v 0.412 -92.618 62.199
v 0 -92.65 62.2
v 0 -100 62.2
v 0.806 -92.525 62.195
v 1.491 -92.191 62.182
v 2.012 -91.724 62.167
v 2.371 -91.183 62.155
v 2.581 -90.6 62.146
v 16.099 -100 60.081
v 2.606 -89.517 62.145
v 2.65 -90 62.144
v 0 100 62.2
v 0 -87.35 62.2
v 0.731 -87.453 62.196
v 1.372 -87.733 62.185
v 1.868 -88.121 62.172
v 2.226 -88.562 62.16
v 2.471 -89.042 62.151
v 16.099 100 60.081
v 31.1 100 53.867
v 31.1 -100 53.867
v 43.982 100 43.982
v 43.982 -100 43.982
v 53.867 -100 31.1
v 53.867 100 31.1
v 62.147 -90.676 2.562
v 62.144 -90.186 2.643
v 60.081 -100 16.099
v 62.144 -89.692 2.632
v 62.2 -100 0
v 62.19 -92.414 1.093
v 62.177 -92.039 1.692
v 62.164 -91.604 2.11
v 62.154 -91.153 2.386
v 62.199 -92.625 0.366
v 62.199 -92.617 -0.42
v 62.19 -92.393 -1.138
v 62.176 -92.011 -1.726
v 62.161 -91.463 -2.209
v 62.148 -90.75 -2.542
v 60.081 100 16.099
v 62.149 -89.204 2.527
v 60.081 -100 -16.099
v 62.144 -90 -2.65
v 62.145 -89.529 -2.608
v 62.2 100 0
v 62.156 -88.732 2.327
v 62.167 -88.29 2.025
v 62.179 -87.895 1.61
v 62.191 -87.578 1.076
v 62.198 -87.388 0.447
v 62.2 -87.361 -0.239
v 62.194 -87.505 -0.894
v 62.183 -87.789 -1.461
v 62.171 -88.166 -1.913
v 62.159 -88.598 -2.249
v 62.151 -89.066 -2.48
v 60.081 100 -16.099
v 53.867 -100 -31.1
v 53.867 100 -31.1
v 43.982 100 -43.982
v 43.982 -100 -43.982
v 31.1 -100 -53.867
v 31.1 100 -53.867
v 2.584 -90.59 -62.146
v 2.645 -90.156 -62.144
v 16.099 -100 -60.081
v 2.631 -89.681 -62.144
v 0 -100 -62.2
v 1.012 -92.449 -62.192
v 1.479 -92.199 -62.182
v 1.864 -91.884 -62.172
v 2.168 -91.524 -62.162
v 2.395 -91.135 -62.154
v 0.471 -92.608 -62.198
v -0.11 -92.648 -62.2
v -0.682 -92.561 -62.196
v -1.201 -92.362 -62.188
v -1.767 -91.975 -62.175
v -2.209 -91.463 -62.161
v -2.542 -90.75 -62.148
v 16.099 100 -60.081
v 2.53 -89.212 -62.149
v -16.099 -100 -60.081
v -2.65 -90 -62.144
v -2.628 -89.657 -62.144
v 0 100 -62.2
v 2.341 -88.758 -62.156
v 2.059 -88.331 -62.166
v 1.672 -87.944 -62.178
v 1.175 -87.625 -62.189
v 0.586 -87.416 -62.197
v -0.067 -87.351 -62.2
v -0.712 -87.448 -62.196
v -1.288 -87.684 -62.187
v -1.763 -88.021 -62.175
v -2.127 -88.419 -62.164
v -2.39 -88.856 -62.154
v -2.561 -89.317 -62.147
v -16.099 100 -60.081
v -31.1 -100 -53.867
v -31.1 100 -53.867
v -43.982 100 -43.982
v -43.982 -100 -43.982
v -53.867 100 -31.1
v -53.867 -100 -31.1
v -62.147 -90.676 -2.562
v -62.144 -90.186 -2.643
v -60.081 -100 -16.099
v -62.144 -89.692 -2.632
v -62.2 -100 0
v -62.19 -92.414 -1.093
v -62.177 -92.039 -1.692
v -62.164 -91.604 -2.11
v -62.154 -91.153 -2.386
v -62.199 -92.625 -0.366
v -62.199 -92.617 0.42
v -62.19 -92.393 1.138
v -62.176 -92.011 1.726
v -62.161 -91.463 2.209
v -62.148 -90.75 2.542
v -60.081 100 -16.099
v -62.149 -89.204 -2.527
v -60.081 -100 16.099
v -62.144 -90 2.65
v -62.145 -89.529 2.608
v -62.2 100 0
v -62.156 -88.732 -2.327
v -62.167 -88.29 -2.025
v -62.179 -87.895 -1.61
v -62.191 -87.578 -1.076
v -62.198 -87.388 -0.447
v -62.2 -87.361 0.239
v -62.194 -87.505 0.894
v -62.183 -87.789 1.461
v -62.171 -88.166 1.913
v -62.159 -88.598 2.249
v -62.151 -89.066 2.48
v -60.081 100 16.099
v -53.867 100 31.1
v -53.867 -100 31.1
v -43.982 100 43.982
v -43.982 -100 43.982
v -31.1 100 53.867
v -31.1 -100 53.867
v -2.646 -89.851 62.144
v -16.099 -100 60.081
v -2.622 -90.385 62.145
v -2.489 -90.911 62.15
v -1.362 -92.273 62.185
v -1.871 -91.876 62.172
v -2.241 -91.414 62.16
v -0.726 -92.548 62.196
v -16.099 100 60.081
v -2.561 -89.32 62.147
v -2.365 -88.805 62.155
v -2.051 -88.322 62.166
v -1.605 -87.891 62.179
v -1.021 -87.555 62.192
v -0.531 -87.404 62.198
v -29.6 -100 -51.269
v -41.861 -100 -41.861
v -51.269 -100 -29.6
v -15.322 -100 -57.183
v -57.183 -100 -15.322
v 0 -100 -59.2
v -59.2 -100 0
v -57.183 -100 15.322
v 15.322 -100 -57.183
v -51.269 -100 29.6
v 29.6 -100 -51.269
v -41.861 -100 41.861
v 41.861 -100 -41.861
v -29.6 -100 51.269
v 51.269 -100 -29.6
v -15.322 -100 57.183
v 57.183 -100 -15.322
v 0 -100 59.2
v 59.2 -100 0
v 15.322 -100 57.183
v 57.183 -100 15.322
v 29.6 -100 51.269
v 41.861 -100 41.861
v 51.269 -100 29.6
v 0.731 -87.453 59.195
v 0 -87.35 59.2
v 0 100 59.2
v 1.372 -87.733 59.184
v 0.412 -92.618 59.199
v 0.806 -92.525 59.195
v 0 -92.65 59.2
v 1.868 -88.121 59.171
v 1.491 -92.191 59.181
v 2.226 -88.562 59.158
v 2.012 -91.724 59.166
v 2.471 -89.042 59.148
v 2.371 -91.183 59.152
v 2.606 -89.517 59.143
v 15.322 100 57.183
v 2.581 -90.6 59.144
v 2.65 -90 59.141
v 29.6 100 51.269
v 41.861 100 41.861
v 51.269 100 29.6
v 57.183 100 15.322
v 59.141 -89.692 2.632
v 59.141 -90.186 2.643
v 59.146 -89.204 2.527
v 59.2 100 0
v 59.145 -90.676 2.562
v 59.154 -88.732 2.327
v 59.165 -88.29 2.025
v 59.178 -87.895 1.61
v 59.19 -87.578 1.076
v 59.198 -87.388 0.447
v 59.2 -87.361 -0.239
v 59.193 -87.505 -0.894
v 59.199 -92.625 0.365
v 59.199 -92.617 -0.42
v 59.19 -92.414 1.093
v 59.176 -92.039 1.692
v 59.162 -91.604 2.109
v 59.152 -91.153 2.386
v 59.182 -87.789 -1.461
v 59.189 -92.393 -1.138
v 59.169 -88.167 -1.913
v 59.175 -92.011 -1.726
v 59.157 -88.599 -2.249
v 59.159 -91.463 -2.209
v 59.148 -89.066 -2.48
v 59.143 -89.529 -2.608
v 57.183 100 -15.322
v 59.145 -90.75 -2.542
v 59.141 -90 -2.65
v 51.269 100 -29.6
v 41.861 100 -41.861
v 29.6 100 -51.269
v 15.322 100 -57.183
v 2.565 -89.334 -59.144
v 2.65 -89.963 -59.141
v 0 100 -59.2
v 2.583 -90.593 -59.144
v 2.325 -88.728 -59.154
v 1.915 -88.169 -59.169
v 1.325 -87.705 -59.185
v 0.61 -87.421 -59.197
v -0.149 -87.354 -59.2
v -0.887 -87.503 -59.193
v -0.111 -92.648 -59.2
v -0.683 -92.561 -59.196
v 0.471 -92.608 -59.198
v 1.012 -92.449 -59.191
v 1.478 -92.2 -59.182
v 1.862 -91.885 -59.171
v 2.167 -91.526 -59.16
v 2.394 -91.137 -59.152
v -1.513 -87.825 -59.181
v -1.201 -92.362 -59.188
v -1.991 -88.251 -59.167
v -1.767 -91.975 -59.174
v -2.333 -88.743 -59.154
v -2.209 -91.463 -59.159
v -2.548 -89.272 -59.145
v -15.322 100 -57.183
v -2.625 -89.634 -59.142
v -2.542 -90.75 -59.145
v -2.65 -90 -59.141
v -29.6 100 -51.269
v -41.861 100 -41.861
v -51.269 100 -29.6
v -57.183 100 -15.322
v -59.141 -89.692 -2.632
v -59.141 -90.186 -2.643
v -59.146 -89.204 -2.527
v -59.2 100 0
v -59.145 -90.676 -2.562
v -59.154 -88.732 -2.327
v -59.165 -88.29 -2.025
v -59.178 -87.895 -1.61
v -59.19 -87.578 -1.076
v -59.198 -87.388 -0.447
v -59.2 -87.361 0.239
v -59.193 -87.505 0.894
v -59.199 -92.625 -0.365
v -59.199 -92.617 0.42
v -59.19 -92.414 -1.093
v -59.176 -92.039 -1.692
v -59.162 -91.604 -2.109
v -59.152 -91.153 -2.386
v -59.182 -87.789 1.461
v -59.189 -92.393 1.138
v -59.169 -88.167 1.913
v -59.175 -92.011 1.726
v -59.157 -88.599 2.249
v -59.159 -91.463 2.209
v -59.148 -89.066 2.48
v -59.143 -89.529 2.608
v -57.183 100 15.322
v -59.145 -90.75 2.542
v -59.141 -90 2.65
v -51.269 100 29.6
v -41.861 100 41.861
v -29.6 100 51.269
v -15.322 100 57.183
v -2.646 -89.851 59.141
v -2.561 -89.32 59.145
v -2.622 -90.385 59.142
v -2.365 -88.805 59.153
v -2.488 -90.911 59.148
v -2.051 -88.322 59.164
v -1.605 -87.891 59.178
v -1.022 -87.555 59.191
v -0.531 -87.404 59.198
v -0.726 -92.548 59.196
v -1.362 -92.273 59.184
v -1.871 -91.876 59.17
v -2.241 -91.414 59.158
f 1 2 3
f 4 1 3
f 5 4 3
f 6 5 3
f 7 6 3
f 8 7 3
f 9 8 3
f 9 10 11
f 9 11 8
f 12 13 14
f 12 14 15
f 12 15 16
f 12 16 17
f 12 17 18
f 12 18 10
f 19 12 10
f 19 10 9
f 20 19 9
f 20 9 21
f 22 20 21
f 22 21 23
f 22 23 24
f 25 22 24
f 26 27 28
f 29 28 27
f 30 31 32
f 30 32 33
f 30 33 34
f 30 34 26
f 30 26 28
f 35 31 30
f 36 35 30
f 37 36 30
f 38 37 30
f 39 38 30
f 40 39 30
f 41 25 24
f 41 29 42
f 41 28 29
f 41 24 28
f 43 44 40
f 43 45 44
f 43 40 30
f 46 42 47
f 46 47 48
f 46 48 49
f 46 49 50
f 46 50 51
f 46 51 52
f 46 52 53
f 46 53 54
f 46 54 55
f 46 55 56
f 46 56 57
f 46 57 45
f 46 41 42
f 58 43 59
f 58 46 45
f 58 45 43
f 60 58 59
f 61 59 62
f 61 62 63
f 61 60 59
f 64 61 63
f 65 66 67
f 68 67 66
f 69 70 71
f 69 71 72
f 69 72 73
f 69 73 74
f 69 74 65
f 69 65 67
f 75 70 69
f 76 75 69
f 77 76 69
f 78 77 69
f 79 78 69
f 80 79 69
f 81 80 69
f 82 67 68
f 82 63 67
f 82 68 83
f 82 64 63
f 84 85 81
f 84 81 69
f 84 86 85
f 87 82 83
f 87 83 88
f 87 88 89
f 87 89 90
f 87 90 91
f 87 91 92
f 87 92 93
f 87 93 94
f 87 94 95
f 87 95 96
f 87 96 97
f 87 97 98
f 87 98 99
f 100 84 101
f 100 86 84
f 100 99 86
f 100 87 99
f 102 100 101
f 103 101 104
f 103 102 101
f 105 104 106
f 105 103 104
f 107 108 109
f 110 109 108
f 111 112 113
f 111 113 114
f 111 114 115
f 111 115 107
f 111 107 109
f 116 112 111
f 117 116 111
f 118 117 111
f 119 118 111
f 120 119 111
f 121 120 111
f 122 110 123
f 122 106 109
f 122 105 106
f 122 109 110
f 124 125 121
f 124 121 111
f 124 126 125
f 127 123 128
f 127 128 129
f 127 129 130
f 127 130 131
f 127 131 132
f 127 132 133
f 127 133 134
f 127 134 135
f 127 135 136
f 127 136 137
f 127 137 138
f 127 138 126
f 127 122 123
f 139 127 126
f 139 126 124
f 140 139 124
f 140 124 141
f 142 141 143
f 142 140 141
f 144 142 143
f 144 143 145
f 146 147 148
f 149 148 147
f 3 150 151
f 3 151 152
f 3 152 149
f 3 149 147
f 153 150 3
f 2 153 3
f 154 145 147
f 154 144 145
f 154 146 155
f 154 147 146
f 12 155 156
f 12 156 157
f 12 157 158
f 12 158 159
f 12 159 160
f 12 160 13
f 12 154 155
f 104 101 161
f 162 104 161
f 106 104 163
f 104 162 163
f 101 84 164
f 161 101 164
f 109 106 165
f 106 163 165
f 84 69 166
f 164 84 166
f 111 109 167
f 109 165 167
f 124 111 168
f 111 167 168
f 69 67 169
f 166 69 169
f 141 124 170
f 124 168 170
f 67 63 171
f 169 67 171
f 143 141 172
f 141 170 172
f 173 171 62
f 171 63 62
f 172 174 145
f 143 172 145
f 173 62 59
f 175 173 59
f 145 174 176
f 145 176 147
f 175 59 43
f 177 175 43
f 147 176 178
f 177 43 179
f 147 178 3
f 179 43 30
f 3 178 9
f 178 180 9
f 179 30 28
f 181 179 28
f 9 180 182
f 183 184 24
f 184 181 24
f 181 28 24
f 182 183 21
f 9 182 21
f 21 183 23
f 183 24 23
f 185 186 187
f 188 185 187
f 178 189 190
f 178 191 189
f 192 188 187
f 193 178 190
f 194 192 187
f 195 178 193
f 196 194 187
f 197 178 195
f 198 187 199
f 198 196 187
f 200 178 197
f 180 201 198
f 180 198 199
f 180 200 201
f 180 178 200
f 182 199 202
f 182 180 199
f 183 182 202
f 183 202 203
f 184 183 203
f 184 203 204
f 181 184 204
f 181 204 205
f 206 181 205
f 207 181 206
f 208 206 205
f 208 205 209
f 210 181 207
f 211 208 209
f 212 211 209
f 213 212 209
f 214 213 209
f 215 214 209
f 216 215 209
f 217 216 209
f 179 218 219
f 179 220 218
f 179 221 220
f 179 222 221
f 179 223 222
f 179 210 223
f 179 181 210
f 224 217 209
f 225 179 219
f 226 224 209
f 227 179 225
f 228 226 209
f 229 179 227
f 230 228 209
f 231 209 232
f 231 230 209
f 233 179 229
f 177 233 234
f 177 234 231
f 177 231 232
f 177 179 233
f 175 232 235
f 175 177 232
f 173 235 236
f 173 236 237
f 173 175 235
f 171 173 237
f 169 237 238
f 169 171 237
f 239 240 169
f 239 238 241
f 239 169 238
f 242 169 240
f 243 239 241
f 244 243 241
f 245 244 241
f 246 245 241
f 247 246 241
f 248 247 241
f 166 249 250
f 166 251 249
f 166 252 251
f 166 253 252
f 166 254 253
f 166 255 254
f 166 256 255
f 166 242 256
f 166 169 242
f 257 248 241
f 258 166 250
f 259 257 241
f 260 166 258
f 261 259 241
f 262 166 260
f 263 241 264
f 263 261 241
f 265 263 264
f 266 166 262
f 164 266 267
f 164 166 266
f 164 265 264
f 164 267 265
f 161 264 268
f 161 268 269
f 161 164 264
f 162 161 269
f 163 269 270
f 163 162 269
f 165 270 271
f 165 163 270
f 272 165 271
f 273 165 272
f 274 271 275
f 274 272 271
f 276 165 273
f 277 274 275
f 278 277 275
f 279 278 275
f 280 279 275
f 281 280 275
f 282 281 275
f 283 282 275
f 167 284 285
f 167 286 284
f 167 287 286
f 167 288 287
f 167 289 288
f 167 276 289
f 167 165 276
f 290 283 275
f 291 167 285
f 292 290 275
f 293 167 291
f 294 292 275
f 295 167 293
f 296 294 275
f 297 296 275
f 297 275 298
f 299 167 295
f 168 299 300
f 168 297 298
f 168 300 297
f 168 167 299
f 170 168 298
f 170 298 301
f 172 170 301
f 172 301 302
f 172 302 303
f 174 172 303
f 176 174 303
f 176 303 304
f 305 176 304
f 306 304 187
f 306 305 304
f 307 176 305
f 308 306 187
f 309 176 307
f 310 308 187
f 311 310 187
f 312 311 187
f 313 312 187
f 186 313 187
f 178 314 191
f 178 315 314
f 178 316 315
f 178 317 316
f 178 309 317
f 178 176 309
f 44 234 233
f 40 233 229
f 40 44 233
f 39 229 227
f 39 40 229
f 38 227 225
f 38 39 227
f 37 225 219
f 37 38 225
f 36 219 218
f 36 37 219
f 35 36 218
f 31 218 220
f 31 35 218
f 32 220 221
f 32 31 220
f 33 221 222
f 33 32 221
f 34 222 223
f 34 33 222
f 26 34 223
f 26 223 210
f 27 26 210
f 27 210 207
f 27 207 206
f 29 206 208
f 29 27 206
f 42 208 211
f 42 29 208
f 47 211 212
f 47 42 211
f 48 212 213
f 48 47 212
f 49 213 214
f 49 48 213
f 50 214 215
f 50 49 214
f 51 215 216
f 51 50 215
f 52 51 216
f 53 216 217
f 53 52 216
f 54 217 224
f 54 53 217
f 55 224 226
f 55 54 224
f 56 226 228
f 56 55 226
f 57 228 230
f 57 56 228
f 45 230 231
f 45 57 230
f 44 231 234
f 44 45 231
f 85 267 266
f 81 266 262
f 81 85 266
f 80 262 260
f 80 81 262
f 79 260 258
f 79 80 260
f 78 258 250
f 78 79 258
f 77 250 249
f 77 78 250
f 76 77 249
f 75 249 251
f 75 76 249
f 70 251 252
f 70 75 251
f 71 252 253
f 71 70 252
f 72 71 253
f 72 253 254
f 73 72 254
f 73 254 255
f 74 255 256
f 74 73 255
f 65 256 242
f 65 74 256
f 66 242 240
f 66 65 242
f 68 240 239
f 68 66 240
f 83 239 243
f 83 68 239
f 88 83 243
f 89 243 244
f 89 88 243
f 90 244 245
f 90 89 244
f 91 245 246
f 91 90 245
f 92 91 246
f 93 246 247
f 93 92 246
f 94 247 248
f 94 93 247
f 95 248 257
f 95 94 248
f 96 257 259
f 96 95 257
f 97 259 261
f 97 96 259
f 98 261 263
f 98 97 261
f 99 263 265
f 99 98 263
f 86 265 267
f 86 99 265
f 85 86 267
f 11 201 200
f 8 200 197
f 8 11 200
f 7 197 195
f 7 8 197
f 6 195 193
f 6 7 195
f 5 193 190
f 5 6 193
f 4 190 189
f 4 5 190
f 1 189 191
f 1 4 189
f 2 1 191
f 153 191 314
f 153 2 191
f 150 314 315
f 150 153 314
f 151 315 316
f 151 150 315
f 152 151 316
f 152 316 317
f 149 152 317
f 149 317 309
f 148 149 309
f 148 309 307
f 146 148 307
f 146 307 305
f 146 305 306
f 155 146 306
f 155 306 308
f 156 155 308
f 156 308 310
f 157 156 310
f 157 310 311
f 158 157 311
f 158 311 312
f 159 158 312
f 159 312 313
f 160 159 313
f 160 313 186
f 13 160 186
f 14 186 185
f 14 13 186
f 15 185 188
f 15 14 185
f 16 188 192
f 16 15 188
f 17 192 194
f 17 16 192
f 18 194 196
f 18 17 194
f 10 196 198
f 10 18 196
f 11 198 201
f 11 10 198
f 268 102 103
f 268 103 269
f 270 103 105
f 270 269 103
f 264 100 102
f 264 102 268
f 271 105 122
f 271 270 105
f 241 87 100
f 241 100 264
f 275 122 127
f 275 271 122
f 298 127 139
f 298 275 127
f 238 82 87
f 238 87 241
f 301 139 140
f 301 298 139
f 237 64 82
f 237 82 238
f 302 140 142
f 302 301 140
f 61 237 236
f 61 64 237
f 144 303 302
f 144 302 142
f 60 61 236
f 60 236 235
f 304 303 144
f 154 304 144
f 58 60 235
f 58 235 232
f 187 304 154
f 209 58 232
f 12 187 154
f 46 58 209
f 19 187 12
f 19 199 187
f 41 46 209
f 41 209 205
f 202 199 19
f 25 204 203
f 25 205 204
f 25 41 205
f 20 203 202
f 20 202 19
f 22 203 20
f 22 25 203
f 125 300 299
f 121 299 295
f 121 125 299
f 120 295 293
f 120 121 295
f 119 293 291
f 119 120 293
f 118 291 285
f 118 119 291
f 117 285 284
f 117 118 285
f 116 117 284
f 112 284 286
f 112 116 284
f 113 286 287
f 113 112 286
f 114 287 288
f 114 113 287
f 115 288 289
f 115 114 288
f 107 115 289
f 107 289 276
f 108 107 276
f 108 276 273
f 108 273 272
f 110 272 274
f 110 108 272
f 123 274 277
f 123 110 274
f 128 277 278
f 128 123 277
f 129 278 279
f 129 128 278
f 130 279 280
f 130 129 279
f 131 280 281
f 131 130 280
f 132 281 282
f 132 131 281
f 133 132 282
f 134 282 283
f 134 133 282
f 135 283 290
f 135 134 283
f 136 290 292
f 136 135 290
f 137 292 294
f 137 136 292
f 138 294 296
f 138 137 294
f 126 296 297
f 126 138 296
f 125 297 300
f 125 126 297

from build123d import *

# Parameters (mm, degrees)
IZIM1_R                     = 62.2
IZIM1_R_2                   = 59.2
Y_KSEKLIK_EKSTR_ZYON1_DEPTH = 100
DAIRESEL_KAPLAMA1_COUNT     = 4


with BuildPart() as part:
    # Çizim1 → Yükseklik-Ekstrüzyon1 (new, symmetric)
    with BuildSketch(Plane(origin=(0, 0, 0), x_dir=(1, 0, 0), z_dir=(0, 1, 0))):
        with Locations(Location((0, 0, 0), (0, 0, 270))):
            Circle(IZIM1_R)
        with Locations(Location((0, 0, 0), (0, 0, 270))):
            Circle(IZIM1_R_2, mode=Mode.SUBTRACT)
    extrude(amount=Y_KSEKLIK_EKSTR_ZYON1_DEPTH, both=True)

    # Çizim10 → M5 Boşluklu Delik1 (revolve, cut)
    with BuildSketch(Plane(origin=(62.2, -90, 0), x_dir=(0, 0, -1), z_dir=(0, 1, 0))):
        Polygon((0, 0), (0, 10.29228064), (2.65, 8.7), (2.65, 0), align=None)
    m5_bo_luklu_delik1 = revolve(axis=Axis((68.55, -90, 0), (-1, 0, 0)), mode=Mode.SUBTRACT)

    # Dairesel Kaplama1: M5 Boşluklu Delik1 ×4 about axis
    dairesel_kaplama1_axis = Axis((0, -100, 0), (0, 1, 0))
    for i in range(1, DAIRESEL_KAPLAMA1_COUNT):
        add(m5_bo_luklu_delik1.rotate(dairesel_kaplama1_axis, i * 360 / DAIRESEL_KAPLAMA1_COUNT), mode=Mode.SUBTRACT)


solid = part.part
